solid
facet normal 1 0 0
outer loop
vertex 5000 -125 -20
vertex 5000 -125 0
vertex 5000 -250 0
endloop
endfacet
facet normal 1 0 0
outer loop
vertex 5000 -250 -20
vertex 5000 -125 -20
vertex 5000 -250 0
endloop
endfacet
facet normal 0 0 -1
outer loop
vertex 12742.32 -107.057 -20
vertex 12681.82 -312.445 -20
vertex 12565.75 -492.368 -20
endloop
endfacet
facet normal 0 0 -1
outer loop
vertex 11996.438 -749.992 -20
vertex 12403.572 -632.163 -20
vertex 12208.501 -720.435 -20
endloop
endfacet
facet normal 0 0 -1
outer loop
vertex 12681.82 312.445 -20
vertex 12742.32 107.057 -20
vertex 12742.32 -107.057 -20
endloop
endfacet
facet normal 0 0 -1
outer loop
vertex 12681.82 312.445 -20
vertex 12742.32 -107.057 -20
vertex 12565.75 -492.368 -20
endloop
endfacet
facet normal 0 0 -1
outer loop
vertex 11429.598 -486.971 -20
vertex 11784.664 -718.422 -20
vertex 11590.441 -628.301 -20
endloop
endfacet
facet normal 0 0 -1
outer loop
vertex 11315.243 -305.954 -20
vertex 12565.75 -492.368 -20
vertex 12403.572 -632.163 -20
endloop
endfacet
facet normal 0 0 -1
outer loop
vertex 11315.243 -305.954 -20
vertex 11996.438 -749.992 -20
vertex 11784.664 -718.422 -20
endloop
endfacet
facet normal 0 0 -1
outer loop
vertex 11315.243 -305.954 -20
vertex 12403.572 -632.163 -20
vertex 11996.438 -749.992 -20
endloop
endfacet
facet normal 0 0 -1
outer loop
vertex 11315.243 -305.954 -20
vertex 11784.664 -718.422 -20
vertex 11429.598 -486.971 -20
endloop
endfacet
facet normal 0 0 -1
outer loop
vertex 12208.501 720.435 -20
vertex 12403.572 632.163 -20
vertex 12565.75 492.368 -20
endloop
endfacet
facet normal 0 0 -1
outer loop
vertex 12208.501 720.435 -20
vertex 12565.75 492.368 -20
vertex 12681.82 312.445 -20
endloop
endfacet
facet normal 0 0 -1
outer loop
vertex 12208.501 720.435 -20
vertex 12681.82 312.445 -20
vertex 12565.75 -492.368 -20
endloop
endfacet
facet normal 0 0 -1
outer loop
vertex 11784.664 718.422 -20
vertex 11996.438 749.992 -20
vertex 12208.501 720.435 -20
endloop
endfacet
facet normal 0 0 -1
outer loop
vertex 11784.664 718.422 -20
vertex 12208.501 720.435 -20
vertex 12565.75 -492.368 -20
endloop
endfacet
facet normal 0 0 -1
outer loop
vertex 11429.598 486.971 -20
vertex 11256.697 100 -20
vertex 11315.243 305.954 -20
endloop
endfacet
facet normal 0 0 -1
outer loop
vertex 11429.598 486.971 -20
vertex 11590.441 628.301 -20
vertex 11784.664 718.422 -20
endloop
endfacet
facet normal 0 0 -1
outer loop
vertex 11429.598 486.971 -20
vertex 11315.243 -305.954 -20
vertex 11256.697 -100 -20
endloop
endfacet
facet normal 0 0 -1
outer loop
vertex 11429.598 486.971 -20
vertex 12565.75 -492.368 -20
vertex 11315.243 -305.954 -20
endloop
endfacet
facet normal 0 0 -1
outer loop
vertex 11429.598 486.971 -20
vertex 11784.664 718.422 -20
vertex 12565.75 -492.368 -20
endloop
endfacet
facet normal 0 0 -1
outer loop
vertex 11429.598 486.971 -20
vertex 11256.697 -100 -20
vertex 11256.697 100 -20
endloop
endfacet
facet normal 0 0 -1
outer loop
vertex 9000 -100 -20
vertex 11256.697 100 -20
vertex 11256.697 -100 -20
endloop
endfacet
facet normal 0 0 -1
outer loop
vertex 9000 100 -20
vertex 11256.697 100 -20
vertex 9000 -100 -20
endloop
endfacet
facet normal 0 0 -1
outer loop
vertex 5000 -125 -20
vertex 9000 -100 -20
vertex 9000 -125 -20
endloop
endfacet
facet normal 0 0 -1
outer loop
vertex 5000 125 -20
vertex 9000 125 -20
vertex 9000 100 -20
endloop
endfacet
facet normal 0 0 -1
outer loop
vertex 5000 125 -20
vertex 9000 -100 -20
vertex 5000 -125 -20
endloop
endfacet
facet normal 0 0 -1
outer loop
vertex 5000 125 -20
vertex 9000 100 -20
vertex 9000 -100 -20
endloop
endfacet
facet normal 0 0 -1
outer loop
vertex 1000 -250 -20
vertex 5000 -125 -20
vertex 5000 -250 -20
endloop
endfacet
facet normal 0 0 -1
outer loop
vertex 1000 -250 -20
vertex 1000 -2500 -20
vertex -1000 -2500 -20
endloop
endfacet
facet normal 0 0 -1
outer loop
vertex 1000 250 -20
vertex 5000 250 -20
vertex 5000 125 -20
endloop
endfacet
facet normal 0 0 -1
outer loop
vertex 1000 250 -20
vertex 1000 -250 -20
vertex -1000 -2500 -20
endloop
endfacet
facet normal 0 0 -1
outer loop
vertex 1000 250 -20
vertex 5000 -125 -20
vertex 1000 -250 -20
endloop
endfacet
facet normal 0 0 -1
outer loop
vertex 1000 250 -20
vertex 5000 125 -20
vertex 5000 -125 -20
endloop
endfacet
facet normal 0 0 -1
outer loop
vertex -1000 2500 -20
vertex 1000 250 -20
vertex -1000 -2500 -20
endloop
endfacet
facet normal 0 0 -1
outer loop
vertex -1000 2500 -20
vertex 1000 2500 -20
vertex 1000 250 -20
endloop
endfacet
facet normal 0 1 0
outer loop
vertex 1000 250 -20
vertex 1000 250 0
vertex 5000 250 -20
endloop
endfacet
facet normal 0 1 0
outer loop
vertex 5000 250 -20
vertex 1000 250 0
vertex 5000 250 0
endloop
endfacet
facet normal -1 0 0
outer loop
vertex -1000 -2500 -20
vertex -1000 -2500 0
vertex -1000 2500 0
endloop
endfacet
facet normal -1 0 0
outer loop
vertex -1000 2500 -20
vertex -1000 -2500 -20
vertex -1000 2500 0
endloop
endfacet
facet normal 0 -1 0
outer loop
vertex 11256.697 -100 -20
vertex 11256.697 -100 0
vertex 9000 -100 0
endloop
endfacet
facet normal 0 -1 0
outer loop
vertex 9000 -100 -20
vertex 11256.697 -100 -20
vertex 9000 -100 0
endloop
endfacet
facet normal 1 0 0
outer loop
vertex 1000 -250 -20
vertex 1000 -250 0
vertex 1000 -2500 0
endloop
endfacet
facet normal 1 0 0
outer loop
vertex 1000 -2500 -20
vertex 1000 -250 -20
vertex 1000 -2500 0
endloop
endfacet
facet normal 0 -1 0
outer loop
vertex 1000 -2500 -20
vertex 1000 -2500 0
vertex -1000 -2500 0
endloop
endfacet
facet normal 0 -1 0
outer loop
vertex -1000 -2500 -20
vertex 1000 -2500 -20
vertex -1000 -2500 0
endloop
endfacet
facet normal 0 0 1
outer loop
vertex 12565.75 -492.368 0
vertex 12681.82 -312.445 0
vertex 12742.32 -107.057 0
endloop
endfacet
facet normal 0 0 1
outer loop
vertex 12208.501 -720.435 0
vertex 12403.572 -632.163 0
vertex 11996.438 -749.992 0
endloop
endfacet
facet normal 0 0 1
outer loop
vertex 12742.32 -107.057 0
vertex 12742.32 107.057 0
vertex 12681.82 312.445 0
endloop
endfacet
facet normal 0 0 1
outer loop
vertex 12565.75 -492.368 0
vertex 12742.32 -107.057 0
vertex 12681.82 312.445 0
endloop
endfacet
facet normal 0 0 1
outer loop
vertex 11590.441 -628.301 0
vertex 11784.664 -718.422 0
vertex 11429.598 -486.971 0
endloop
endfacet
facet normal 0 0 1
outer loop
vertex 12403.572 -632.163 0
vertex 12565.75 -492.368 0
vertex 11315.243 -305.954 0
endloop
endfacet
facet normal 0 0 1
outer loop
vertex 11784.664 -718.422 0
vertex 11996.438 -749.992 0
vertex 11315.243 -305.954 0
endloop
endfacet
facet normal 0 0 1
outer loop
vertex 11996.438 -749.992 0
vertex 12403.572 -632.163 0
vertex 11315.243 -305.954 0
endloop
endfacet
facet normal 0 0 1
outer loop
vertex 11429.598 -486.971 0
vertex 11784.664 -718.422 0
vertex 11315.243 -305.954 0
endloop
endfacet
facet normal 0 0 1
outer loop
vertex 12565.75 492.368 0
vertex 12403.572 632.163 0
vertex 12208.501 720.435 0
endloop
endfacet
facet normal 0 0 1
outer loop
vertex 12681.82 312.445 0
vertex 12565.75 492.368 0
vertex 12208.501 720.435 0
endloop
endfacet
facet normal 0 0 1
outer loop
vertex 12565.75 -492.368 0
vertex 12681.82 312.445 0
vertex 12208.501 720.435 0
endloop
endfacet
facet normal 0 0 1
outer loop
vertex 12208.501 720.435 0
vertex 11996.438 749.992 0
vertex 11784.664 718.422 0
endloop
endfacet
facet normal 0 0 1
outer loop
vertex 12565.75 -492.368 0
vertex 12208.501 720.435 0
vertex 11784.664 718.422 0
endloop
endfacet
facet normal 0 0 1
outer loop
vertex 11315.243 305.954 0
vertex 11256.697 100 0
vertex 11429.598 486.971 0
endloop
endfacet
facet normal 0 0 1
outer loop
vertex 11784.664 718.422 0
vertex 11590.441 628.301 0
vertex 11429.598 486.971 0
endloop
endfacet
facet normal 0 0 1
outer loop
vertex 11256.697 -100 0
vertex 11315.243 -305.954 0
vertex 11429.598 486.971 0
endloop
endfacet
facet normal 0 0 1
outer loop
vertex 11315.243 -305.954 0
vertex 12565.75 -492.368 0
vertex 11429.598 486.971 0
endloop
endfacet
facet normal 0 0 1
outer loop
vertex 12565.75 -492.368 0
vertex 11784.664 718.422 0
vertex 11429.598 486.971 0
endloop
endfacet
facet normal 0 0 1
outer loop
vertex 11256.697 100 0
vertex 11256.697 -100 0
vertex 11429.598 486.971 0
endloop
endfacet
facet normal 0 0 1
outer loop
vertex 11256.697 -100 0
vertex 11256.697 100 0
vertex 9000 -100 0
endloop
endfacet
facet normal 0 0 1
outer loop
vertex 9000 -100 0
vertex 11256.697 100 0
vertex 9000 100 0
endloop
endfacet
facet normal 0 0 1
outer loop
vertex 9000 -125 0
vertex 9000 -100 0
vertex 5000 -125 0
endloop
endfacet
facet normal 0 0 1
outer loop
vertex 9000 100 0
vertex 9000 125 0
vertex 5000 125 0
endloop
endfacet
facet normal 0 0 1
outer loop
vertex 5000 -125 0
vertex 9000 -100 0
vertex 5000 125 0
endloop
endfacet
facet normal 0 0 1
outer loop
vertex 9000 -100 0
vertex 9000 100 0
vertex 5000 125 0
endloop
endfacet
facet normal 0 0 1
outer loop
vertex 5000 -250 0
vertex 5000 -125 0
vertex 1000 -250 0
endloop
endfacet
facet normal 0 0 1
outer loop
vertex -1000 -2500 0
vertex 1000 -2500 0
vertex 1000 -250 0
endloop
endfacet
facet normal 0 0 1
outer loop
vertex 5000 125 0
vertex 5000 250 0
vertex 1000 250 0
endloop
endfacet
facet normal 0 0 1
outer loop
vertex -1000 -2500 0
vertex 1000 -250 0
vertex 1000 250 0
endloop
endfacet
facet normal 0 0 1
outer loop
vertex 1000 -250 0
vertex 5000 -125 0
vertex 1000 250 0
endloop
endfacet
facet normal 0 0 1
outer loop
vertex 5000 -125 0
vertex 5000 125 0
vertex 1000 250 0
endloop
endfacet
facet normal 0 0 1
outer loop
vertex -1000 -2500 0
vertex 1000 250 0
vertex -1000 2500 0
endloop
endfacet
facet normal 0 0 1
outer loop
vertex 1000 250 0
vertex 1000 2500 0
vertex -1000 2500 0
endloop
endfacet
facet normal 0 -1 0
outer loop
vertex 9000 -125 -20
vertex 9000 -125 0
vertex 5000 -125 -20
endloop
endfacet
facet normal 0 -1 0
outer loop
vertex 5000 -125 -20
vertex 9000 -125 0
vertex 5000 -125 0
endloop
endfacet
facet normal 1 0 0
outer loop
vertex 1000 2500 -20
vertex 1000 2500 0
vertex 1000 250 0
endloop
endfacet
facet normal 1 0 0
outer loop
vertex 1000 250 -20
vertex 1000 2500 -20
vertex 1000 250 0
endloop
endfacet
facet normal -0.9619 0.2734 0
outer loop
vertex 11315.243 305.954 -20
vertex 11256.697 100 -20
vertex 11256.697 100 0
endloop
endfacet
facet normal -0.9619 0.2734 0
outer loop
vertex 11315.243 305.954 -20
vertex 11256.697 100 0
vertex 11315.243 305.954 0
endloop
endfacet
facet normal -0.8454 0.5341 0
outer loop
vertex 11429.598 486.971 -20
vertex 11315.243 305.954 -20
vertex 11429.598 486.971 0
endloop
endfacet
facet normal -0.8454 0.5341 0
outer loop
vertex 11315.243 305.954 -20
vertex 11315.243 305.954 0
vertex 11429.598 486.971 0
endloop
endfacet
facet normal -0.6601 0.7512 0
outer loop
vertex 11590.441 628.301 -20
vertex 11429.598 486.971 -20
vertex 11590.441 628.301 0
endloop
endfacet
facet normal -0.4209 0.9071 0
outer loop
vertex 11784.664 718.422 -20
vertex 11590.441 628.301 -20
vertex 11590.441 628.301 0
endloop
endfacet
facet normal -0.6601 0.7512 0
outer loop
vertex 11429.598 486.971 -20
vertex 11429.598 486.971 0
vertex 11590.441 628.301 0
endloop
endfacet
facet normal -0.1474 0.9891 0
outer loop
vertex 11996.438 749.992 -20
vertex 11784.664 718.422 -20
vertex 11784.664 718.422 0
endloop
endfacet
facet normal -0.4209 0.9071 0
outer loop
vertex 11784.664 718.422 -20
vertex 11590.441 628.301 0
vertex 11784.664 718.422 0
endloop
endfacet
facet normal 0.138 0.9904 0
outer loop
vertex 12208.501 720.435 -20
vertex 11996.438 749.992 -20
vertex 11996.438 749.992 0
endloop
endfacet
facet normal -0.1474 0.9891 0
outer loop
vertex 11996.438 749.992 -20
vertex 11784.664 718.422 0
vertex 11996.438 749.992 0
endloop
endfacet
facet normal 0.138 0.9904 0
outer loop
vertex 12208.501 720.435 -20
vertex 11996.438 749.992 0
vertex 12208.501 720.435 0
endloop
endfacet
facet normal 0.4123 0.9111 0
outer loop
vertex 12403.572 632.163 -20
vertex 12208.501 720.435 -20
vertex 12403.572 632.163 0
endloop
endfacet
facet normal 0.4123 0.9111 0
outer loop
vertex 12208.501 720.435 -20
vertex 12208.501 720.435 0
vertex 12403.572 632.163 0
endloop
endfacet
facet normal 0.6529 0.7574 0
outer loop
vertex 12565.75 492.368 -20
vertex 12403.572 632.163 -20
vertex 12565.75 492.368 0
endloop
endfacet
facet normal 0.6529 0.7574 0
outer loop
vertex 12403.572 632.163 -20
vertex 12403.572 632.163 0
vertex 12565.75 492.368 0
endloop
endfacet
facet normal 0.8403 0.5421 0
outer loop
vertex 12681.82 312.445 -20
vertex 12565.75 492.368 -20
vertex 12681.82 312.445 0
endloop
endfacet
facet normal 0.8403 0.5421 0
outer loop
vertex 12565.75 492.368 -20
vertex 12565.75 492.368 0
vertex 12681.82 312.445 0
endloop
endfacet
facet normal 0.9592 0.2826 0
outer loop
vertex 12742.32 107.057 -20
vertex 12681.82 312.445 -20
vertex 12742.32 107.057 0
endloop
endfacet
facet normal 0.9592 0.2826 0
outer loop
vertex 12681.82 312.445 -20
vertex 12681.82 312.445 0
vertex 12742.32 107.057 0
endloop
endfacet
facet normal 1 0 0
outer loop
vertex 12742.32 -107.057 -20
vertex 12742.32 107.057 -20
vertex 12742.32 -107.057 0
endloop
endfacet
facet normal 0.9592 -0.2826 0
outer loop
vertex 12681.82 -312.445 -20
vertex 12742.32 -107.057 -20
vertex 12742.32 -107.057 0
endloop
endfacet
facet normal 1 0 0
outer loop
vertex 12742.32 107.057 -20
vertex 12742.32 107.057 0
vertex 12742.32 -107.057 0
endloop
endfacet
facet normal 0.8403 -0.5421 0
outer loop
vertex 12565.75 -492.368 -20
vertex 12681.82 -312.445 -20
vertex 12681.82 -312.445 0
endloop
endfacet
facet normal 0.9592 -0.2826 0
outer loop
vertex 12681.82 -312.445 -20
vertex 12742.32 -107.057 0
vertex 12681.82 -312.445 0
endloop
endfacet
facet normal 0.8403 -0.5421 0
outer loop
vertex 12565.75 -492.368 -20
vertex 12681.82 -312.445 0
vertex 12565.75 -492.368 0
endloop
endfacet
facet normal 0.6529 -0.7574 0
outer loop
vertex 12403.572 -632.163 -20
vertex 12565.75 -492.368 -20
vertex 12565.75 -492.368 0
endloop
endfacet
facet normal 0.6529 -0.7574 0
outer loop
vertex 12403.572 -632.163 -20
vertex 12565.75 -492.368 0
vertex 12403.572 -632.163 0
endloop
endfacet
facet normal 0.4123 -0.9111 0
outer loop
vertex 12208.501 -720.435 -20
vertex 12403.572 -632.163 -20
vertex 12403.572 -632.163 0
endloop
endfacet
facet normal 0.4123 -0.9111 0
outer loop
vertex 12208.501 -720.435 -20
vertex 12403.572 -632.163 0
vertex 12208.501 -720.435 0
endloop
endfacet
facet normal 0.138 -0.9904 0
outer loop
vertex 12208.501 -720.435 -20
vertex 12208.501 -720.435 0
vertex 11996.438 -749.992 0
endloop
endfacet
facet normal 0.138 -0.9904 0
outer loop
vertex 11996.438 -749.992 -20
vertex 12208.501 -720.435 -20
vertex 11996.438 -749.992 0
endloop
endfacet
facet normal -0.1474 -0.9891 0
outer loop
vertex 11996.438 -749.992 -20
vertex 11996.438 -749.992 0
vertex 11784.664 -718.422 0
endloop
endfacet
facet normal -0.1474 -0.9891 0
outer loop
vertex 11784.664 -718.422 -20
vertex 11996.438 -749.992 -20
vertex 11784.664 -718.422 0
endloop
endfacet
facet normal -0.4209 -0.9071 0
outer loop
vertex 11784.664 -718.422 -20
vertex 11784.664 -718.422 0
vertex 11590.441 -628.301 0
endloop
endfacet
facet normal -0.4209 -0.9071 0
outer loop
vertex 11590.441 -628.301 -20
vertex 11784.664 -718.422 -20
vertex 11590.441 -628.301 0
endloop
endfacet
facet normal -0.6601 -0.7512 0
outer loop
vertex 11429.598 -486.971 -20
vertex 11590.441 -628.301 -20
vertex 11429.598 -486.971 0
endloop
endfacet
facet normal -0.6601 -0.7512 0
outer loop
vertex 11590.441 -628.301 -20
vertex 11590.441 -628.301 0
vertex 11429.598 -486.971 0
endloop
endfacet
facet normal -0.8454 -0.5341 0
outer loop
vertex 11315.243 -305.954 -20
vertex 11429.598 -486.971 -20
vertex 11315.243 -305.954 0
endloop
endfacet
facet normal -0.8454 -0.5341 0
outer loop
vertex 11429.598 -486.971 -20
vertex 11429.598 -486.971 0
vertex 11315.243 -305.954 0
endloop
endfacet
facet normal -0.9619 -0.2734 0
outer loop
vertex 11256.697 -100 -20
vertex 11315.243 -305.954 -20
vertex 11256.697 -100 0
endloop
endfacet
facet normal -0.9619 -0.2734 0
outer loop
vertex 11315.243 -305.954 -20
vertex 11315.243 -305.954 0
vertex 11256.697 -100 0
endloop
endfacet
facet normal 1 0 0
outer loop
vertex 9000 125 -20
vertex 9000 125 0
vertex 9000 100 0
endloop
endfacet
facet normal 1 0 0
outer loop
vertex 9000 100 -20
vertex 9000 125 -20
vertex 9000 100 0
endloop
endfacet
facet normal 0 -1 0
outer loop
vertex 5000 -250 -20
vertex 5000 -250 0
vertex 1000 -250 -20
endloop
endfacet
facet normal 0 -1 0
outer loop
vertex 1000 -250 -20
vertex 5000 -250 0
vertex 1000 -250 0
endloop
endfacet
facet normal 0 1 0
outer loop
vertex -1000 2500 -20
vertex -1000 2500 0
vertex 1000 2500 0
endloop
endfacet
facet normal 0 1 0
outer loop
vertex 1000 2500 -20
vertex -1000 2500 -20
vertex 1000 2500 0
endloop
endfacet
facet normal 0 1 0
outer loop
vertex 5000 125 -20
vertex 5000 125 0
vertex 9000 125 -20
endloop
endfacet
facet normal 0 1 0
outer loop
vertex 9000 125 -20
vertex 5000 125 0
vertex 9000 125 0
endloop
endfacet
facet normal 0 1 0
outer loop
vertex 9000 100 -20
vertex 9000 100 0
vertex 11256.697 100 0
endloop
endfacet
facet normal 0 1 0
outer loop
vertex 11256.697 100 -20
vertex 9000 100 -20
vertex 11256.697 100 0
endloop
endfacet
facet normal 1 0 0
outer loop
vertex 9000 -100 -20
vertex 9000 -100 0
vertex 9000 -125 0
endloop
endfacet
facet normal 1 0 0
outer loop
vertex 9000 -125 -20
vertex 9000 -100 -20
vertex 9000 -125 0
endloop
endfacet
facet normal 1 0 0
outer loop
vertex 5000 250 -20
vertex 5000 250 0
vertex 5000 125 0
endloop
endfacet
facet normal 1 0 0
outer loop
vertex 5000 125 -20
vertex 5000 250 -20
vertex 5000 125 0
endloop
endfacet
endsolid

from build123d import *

# Parameters (mm, degrees)
BOSS_EXTRUDE1_DEPTH = 20


with BuildPart() as part:
    # Sketch1 → Boss-Extrude1 (new body)
    with BuildSketch(Plane.XY):
        with BuildLine():
            Line((1000, 250), (5000, 250))
            Line((5000, 250), (5000, 125))
            Line((5000, 125), (9000, 125))
            Line((9000, 125), (9000, 100))
            Line((9000, 100), (11256.696562634, 100))
            ThreePointArc((11256.696562634, 100), (12750, 0), (11256.696562634, -100))
            Line((11256.696562634, -100), (9000, -100))
            Line((9000, -100), (9000, -125))
            Line((9000, -125), (5000, -125))
            Line((5000, -125), (5000, -250))
            Line((5000, -250), (1000, -250))
            Line((1000, -250), (1000, -2500))
            Line((1000, -2500), (-1000, -2500))
            Line((-1000, -2500), (-1000, 2500))
            Line((-1000, 2500), (1000, 2500))
            Line((1000, 2500), (1000, 250))
        make_face()
    extrude(amount=-BOSS_EXTRUDE1_DEPTH)


solid = part.part
